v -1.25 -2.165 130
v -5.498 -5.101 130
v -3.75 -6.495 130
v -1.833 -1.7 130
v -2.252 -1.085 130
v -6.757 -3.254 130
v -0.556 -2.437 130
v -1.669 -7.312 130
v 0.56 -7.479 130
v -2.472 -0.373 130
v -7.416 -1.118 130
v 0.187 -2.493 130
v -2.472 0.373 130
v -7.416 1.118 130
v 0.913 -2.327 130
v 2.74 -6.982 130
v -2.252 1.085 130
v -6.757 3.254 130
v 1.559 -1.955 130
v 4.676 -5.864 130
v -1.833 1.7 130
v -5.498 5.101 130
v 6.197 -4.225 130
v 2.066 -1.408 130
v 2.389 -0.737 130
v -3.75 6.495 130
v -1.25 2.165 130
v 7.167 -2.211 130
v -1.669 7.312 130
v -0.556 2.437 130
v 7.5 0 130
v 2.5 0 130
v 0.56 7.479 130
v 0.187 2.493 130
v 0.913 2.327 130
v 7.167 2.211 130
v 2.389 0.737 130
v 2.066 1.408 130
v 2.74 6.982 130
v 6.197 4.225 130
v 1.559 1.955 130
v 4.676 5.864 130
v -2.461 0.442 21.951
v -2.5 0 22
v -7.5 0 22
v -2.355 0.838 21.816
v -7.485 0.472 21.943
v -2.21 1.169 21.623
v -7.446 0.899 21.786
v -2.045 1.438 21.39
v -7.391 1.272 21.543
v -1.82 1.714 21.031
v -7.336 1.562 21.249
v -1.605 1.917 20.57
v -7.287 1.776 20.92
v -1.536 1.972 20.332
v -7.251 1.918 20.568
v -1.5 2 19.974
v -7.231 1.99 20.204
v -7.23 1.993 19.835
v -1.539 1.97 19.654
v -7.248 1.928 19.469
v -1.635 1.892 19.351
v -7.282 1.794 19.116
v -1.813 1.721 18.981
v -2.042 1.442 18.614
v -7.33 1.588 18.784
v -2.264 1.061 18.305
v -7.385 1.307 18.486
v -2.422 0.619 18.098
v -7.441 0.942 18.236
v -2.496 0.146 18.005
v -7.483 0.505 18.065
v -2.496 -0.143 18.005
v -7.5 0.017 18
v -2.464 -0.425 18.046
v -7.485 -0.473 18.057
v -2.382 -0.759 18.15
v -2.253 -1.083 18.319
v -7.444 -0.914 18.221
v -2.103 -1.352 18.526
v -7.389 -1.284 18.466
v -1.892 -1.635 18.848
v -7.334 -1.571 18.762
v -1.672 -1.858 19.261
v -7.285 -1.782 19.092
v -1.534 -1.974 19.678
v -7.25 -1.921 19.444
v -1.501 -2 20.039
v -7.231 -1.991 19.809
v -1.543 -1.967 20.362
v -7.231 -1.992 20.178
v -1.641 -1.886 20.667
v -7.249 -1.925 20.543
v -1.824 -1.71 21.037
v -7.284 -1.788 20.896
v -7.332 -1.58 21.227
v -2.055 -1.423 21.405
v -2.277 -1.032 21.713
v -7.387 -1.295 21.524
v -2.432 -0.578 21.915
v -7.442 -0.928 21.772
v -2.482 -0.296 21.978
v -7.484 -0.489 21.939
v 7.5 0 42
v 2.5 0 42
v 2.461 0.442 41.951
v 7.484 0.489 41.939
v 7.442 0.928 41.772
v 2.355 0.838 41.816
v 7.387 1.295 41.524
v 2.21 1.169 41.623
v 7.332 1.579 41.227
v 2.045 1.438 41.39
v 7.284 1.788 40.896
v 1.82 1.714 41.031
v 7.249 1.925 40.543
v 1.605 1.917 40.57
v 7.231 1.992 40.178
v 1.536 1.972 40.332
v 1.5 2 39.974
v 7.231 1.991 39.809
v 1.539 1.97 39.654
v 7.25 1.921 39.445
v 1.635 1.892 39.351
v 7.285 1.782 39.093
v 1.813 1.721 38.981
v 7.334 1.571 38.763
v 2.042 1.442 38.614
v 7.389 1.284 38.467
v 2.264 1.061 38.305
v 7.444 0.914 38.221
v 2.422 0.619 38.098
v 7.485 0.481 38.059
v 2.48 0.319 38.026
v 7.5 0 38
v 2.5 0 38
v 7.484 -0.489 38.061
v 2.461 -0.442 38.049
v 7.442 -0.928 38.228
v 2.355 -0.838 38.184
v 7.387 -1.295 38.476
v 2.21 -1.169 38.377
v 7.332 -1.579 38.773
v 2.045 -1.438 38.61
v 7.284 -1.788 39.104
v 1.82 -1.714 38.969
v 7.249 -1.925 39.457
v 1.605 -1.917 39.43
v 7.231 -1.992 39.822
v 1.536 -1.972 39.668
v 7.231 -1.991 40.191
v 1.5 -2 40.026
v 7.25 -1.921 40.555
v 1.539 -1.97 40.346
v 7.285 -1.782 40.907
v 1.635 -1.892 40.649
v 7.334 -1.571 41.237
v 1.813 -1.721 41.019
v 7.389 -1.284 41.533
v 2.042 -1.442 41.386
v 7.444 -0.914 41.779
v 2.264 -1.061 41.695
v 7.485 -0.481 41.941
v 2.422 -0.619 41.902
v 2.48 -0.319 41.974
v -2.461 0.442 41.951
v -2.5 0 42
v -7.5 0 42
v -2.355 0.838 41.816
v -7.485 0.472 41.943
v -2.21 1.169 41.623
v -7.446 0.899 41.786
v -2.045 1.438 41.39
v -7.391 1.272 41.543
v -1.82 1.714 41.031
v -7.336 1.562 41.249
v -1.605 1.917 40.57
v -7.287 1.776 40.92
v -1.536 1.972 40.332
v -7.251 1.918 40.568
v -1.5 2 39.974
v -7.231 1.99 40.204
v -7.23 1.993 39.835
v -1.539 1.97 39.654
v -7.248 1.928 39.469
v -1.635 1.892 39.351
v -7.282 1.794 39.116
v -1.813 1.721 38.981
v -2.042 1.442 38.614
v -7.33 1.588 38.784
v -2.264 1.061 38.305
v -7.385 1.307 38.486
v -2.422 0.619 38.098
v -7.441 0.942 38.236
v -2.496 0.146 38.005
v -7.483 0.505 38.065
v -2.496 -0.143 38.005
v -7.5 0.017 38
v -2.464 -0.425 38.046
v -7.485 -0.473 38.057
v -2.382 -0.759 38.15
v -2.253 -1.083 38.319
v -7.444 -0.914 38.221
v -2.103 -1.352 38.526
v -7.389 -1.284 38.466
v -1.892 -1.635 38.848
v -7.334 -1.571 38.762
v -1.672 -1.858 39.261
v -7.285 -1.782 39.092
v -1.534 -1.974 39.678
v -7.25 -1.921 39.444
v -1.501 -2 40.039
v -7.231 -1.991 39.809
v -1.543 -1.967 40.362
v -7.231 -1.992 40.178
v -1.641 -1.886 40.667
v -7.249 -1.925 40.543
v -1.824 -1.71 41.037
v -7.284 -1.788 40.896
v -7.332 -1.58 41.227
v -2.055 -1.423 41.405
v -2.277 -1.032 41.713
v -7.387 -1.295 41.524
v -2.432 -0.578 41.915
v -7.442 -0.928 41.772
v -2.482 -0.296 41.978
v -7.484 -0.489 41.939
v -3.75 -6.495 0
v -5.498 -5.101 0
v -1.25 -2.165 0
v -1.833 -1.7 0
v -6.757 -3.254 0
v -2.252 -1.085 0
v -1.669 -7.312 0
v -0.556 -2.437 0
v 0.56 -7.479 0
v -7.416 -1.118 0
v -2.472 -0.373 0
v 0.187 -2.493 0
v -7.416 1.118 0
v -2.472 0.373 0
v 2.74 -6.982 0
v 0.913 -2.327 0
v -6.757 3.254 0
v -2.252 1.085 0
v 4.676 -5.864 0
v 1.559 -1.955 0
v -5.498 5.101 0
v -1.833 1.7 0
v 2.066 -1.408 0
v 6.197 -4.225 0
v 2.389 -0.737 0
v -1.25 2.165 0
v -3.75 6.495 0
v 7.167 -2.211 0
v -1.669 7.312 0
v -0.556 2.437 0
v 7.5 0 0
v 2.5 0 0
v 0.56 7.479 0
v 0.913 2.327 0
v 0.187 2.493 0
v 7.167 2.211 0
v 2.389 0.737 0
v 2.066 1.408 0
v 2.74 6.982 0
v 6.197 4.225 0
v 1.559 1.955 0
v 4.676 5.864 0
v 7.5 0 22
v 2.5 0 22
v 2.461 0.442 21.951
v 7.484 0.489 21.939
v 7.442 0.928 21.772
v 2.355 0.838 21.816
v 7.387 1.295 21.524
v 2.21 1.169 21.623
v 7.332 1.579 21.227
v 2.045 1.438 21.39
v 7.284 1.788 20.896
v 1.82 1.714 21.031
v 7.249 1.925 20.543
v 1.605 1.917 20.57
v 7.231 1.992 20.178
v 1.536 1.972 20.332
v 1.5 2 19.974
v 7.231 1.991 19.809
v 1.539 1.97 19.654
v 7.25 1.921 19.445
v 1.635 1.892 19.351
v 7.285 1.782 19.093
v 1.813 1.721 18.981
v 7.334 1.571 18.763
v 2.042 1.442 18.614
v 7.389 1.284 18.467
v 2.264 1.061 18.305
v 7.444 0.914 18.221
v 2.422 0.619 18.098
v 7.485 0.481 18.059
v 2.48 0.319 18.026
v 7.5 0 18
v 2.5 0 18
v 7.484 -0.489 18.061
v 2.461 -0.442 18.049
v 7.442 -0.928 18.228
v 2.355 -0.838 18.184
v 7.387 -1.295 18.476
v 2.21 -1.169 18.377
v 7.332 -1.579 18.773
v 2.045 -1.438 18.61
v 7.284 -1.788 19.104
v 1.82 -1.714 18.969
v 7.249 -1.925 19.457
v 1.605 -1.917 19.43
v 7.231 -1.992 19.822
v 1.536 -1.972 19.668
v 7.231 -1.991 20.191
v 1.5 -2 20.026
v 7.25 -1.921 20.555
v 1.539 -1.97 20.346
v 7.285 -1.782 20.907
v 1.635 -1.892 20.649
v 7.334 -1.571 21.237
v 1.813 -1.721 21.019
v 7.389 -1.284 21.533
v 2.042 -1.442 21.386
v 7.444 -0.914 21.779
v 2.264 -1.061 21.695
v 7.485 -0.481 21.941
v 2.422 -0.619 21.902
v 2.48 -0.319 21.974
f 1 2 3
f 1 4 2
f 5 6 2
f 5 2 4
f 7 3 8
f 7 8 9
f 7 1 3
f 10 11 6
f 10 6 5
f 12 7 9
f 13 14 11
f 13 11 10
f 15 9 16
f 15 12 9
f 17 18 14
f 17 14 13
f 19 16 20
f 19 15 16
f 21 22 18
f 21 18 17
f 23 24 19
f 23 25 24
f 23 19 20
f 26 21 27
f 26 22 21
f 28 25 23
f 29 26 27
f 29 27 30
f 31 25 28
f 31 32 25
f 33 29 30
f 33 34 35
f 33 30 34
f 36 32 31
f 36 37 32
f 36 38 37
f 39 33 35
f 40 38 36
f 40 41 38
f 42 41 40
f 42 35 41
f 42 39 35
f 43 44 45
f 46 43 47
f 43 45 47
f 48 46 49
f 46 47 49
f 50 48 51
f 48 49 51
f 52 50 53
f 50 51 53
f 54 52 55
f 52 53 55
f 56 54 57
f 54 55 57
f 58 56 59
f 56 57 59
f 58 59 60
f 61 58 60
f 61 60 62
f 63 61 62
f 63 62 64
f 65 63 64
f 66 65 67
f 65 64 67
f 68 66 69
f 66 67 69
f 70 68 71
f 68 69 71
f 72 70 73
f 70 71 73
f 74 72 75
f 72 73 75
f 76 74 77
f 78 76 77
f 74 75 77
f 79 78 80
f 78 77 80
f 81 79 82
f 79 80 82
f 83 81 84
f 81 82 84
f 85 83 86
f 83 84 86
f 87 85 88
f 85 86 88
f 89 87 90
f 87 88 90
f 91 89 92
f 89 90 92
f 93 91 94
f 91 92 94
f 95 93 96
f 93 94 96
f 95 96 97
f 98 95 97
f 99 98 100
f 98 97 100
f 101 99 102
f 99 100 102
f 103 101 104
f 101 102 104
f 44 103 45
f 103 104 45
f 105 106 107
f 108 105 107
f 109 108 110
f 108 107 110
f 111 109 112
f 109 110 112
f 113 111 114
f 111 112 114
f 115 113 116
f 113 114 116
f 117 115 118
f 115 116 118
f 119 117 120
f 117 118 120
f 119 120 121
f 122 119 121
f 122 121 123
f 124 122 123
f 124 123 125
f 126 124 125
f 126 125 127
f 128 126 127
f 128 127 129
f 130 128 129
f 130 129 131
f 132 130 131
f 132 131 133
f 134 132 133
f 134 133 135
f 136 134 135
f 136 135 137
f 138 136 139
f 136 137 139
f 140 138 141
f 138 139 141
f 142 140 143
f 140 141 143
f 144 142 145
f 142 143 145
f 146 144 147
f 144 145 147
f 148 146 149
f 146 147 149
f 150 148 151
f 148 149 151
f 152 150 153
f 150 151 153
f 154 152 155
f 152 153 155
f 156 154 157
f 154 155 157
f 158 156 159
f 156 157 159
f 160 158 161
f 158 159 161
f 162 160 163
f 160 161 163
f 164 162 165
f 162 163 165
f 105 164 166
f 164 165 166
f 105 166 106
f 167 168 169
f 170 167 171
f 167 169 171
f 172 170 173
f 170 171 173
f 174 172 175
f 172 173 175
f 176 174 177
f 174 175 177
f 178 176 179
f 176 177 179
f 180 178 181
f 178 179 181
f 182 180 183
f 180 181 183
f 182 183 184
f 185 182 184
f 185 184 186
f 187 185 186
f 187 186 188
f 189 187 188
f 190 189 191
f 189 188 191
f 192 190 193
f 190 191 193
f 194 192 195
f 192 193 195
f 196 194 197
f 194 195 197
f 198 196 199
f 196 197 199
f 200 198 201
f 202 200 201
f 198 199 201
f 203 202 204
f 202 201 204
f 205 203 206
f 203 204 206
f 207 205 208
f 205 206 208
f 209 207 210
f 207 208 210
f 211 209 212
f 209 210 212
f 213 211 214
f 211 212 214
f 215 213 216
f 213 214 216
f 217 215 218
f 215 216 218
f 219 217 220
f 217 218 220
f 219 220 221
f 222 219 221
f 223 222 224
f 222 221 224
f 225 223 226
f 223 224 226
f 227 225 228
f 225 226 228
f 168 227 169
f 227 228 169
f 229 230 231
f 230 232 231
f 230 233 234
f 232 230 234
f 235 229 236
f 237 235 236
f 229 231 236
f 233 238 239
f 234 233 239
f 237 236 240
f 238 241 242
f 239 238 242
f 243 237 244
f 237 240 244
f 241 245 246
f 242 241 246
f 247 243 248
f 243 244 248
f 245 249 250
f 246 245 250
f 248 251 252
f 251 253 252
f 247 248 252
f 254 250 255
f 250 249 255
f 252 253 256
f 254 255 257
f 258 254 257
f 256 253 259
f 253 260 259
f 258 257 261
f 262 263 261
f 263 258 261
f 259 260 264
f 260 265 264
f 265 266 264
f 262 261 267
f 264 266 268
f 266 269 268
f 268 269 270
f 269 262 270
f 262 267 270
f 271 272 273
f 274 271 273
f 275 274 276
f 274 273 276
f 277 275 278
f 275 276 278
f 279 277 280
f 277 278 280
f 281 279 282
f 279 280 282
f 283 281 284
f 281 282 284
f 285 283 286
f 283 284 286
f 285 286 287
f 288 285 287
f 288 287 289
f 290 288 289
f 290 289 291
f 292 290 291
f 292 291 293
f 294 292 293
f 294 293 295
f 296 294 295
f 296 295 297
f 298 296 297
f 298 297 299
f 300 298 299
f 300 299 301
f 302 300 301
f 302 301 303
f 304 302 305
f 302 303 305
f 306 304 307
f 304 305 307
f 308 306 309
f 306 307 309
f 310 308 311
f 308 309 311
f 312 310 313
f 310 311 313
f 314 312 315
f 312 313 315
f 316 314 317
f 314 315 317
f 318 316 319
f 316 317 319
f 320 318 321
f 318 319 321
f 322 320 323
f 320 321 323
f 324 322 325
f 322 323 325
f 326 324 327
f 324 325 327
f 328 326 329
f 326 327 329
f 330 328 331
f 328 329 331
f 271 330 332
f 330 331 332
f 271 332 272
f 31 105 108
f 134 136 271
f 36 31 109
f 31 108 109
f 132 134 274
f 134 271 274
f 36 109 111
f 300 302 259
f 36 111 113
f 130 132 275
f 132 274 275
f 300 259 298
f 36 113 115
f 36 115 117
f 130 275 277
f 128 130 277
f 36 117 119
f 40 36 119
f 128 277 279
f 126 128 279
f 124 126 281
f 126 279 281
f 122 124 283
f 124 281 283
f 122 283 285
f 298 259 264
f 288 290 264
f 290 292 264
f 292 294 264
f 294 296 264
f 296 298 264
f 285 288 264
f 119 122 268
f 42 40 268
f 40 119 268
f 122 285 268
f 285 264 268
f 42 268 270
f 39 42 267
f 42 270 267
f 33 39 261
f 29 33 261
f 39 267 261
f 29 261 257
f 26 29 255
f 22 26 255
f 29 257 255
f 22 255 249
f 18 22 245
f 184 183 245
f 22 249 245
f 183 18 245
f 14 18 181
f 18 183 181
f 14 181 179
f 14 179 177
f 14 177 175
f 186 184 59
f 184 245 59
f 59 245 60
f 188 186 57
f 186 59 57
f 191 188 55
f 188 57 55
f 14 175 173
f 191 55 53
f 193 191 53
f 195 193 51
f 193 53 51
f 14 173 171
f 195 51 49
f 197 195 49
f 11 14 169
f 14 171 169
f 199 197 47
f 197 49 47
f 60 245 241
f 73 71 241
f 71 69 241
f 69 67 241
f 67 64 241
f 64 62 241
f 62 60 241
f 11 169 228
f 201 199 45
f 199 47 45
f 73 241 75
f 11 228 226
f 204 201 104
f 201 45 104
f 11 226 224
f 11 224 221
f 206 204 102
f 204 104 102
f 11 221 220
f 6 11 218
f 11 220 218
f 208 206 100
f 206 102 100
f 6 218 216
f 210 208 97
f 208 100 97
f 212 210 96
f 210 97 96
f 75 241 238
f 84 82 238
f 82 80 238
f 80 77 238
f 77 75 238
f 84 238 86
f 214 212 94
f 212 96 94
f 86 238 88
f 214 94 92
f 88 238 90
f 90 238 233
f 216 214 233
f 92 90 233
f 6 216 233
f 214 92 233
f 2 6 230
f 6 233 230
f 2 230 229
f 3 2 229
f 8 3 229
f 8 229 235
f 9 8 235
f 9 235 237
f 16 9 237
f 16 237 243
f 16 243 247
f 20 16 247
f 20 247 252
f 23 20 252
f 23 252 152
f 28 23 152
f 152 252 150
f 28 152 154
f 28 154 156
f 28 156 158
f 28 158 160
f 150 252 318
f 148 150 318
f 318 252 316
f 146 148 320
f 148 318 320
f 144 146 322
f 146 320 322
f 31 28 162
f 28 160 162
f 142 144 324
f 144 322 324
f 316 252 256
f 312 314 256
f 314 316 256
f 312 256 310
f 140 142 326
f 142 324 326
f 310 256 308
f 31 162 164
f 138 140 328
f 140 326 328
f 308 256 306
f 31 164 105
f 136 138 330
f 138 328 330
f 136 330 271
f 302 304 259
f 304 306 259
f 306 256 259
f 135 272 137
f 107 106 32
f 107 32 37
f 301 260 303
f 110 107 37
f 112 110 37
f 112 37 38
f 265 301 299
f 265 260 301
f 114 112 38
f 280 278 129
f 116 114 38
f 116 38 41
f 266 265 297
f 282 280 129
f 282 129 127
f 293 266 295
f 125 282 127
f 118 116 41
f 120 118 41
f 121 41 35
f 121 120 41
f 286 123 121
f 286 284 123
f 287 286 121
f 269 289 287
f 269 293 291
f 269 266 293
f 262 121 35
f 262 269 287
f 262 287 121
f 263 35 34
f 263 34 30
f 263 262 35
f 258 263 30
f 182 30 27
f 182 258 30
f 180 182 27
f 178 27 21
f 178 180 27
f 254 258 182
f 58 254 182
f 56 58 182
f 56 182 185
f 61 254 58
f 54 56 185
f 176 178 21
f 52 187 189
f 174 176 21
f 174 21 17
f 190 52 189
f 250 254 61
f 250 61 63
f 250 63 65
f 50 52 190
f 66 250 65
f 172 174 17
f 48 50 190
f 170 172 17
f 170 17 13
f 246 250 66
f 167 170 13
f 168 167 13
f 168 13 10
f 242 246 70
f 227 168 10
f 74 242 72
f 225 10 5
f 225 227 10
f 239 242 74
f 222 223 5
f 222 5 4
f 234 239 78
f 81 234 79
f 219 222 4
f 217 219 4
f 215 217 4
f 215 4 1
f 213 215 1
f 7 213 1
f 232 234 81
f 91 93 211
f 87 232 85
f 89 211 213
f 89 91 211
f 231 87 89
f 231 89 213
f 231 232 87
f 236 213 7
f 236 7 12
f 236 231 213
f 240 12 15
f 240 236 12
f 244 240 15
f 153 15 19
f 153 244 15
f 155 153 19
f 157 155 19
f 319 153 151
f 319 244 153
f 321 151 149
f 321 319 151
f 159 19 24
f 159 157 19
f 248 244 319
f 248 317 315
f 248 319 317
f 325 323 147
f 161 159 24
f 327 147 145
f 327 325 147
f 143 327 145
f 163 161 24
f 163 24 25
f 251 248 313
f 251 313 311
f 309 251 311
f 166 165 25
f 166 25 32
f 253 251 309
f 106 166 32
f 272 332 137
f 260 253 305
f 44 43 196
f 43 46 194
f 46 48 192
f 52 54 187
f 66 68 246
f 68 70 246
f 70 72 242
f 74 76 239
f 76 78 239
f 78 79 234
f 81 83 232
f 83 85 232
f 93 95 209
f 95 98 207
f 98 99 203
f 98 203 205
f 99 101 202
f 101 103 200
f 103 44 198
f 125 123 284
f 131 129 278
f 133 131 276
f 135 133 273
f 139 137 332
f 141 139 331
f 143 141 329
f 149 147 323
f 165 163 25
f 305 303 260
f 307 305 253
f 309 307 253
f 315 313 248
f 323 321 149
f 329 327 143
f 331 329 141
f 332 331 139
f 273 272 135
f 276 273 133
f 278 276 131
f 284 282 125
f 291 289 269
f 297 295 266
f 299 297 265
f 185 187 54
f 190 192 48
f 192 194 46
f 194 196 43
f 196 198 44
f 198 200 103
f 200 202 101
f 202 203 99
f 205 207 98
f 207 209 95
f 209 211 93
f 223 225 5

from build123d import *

# Parameters (mm, degrees)
SKETCH1_R           = 7.5
SKETCH1_R_2         = 2.5
BOSS_EXTRUDE1_DEPTH = 130
SKETCH2_R           = 2
CUT_EXTRUDE1_DEPTH  = 16


with BuildPart() as part:
    # Sketch1 → Boss-Extrude1 (new body)
    with BuildSketch(Plane.XY):
        Circle(SKETCH1_R)
        Circle(SKETCH1_R_2, mode=Mode.SUBTRACT)
    extrude(amount=BOSS_EXTRUDE1_DEPTH)

    # Sketch2 → Cut-Extrude1 (cut)
    with BuildSketch(Plane.ZY.offset(7.5)):
        with Locations((20, 0)):
            Circle(SKETCH2_R)
        with Locations((40, 0)):
            Circle(SKETCH2_R)
    extrude(amount=-CUT_EXTRUDE1_DEPTH, mode=Mode.SUBTRACT)


solid = part.part
